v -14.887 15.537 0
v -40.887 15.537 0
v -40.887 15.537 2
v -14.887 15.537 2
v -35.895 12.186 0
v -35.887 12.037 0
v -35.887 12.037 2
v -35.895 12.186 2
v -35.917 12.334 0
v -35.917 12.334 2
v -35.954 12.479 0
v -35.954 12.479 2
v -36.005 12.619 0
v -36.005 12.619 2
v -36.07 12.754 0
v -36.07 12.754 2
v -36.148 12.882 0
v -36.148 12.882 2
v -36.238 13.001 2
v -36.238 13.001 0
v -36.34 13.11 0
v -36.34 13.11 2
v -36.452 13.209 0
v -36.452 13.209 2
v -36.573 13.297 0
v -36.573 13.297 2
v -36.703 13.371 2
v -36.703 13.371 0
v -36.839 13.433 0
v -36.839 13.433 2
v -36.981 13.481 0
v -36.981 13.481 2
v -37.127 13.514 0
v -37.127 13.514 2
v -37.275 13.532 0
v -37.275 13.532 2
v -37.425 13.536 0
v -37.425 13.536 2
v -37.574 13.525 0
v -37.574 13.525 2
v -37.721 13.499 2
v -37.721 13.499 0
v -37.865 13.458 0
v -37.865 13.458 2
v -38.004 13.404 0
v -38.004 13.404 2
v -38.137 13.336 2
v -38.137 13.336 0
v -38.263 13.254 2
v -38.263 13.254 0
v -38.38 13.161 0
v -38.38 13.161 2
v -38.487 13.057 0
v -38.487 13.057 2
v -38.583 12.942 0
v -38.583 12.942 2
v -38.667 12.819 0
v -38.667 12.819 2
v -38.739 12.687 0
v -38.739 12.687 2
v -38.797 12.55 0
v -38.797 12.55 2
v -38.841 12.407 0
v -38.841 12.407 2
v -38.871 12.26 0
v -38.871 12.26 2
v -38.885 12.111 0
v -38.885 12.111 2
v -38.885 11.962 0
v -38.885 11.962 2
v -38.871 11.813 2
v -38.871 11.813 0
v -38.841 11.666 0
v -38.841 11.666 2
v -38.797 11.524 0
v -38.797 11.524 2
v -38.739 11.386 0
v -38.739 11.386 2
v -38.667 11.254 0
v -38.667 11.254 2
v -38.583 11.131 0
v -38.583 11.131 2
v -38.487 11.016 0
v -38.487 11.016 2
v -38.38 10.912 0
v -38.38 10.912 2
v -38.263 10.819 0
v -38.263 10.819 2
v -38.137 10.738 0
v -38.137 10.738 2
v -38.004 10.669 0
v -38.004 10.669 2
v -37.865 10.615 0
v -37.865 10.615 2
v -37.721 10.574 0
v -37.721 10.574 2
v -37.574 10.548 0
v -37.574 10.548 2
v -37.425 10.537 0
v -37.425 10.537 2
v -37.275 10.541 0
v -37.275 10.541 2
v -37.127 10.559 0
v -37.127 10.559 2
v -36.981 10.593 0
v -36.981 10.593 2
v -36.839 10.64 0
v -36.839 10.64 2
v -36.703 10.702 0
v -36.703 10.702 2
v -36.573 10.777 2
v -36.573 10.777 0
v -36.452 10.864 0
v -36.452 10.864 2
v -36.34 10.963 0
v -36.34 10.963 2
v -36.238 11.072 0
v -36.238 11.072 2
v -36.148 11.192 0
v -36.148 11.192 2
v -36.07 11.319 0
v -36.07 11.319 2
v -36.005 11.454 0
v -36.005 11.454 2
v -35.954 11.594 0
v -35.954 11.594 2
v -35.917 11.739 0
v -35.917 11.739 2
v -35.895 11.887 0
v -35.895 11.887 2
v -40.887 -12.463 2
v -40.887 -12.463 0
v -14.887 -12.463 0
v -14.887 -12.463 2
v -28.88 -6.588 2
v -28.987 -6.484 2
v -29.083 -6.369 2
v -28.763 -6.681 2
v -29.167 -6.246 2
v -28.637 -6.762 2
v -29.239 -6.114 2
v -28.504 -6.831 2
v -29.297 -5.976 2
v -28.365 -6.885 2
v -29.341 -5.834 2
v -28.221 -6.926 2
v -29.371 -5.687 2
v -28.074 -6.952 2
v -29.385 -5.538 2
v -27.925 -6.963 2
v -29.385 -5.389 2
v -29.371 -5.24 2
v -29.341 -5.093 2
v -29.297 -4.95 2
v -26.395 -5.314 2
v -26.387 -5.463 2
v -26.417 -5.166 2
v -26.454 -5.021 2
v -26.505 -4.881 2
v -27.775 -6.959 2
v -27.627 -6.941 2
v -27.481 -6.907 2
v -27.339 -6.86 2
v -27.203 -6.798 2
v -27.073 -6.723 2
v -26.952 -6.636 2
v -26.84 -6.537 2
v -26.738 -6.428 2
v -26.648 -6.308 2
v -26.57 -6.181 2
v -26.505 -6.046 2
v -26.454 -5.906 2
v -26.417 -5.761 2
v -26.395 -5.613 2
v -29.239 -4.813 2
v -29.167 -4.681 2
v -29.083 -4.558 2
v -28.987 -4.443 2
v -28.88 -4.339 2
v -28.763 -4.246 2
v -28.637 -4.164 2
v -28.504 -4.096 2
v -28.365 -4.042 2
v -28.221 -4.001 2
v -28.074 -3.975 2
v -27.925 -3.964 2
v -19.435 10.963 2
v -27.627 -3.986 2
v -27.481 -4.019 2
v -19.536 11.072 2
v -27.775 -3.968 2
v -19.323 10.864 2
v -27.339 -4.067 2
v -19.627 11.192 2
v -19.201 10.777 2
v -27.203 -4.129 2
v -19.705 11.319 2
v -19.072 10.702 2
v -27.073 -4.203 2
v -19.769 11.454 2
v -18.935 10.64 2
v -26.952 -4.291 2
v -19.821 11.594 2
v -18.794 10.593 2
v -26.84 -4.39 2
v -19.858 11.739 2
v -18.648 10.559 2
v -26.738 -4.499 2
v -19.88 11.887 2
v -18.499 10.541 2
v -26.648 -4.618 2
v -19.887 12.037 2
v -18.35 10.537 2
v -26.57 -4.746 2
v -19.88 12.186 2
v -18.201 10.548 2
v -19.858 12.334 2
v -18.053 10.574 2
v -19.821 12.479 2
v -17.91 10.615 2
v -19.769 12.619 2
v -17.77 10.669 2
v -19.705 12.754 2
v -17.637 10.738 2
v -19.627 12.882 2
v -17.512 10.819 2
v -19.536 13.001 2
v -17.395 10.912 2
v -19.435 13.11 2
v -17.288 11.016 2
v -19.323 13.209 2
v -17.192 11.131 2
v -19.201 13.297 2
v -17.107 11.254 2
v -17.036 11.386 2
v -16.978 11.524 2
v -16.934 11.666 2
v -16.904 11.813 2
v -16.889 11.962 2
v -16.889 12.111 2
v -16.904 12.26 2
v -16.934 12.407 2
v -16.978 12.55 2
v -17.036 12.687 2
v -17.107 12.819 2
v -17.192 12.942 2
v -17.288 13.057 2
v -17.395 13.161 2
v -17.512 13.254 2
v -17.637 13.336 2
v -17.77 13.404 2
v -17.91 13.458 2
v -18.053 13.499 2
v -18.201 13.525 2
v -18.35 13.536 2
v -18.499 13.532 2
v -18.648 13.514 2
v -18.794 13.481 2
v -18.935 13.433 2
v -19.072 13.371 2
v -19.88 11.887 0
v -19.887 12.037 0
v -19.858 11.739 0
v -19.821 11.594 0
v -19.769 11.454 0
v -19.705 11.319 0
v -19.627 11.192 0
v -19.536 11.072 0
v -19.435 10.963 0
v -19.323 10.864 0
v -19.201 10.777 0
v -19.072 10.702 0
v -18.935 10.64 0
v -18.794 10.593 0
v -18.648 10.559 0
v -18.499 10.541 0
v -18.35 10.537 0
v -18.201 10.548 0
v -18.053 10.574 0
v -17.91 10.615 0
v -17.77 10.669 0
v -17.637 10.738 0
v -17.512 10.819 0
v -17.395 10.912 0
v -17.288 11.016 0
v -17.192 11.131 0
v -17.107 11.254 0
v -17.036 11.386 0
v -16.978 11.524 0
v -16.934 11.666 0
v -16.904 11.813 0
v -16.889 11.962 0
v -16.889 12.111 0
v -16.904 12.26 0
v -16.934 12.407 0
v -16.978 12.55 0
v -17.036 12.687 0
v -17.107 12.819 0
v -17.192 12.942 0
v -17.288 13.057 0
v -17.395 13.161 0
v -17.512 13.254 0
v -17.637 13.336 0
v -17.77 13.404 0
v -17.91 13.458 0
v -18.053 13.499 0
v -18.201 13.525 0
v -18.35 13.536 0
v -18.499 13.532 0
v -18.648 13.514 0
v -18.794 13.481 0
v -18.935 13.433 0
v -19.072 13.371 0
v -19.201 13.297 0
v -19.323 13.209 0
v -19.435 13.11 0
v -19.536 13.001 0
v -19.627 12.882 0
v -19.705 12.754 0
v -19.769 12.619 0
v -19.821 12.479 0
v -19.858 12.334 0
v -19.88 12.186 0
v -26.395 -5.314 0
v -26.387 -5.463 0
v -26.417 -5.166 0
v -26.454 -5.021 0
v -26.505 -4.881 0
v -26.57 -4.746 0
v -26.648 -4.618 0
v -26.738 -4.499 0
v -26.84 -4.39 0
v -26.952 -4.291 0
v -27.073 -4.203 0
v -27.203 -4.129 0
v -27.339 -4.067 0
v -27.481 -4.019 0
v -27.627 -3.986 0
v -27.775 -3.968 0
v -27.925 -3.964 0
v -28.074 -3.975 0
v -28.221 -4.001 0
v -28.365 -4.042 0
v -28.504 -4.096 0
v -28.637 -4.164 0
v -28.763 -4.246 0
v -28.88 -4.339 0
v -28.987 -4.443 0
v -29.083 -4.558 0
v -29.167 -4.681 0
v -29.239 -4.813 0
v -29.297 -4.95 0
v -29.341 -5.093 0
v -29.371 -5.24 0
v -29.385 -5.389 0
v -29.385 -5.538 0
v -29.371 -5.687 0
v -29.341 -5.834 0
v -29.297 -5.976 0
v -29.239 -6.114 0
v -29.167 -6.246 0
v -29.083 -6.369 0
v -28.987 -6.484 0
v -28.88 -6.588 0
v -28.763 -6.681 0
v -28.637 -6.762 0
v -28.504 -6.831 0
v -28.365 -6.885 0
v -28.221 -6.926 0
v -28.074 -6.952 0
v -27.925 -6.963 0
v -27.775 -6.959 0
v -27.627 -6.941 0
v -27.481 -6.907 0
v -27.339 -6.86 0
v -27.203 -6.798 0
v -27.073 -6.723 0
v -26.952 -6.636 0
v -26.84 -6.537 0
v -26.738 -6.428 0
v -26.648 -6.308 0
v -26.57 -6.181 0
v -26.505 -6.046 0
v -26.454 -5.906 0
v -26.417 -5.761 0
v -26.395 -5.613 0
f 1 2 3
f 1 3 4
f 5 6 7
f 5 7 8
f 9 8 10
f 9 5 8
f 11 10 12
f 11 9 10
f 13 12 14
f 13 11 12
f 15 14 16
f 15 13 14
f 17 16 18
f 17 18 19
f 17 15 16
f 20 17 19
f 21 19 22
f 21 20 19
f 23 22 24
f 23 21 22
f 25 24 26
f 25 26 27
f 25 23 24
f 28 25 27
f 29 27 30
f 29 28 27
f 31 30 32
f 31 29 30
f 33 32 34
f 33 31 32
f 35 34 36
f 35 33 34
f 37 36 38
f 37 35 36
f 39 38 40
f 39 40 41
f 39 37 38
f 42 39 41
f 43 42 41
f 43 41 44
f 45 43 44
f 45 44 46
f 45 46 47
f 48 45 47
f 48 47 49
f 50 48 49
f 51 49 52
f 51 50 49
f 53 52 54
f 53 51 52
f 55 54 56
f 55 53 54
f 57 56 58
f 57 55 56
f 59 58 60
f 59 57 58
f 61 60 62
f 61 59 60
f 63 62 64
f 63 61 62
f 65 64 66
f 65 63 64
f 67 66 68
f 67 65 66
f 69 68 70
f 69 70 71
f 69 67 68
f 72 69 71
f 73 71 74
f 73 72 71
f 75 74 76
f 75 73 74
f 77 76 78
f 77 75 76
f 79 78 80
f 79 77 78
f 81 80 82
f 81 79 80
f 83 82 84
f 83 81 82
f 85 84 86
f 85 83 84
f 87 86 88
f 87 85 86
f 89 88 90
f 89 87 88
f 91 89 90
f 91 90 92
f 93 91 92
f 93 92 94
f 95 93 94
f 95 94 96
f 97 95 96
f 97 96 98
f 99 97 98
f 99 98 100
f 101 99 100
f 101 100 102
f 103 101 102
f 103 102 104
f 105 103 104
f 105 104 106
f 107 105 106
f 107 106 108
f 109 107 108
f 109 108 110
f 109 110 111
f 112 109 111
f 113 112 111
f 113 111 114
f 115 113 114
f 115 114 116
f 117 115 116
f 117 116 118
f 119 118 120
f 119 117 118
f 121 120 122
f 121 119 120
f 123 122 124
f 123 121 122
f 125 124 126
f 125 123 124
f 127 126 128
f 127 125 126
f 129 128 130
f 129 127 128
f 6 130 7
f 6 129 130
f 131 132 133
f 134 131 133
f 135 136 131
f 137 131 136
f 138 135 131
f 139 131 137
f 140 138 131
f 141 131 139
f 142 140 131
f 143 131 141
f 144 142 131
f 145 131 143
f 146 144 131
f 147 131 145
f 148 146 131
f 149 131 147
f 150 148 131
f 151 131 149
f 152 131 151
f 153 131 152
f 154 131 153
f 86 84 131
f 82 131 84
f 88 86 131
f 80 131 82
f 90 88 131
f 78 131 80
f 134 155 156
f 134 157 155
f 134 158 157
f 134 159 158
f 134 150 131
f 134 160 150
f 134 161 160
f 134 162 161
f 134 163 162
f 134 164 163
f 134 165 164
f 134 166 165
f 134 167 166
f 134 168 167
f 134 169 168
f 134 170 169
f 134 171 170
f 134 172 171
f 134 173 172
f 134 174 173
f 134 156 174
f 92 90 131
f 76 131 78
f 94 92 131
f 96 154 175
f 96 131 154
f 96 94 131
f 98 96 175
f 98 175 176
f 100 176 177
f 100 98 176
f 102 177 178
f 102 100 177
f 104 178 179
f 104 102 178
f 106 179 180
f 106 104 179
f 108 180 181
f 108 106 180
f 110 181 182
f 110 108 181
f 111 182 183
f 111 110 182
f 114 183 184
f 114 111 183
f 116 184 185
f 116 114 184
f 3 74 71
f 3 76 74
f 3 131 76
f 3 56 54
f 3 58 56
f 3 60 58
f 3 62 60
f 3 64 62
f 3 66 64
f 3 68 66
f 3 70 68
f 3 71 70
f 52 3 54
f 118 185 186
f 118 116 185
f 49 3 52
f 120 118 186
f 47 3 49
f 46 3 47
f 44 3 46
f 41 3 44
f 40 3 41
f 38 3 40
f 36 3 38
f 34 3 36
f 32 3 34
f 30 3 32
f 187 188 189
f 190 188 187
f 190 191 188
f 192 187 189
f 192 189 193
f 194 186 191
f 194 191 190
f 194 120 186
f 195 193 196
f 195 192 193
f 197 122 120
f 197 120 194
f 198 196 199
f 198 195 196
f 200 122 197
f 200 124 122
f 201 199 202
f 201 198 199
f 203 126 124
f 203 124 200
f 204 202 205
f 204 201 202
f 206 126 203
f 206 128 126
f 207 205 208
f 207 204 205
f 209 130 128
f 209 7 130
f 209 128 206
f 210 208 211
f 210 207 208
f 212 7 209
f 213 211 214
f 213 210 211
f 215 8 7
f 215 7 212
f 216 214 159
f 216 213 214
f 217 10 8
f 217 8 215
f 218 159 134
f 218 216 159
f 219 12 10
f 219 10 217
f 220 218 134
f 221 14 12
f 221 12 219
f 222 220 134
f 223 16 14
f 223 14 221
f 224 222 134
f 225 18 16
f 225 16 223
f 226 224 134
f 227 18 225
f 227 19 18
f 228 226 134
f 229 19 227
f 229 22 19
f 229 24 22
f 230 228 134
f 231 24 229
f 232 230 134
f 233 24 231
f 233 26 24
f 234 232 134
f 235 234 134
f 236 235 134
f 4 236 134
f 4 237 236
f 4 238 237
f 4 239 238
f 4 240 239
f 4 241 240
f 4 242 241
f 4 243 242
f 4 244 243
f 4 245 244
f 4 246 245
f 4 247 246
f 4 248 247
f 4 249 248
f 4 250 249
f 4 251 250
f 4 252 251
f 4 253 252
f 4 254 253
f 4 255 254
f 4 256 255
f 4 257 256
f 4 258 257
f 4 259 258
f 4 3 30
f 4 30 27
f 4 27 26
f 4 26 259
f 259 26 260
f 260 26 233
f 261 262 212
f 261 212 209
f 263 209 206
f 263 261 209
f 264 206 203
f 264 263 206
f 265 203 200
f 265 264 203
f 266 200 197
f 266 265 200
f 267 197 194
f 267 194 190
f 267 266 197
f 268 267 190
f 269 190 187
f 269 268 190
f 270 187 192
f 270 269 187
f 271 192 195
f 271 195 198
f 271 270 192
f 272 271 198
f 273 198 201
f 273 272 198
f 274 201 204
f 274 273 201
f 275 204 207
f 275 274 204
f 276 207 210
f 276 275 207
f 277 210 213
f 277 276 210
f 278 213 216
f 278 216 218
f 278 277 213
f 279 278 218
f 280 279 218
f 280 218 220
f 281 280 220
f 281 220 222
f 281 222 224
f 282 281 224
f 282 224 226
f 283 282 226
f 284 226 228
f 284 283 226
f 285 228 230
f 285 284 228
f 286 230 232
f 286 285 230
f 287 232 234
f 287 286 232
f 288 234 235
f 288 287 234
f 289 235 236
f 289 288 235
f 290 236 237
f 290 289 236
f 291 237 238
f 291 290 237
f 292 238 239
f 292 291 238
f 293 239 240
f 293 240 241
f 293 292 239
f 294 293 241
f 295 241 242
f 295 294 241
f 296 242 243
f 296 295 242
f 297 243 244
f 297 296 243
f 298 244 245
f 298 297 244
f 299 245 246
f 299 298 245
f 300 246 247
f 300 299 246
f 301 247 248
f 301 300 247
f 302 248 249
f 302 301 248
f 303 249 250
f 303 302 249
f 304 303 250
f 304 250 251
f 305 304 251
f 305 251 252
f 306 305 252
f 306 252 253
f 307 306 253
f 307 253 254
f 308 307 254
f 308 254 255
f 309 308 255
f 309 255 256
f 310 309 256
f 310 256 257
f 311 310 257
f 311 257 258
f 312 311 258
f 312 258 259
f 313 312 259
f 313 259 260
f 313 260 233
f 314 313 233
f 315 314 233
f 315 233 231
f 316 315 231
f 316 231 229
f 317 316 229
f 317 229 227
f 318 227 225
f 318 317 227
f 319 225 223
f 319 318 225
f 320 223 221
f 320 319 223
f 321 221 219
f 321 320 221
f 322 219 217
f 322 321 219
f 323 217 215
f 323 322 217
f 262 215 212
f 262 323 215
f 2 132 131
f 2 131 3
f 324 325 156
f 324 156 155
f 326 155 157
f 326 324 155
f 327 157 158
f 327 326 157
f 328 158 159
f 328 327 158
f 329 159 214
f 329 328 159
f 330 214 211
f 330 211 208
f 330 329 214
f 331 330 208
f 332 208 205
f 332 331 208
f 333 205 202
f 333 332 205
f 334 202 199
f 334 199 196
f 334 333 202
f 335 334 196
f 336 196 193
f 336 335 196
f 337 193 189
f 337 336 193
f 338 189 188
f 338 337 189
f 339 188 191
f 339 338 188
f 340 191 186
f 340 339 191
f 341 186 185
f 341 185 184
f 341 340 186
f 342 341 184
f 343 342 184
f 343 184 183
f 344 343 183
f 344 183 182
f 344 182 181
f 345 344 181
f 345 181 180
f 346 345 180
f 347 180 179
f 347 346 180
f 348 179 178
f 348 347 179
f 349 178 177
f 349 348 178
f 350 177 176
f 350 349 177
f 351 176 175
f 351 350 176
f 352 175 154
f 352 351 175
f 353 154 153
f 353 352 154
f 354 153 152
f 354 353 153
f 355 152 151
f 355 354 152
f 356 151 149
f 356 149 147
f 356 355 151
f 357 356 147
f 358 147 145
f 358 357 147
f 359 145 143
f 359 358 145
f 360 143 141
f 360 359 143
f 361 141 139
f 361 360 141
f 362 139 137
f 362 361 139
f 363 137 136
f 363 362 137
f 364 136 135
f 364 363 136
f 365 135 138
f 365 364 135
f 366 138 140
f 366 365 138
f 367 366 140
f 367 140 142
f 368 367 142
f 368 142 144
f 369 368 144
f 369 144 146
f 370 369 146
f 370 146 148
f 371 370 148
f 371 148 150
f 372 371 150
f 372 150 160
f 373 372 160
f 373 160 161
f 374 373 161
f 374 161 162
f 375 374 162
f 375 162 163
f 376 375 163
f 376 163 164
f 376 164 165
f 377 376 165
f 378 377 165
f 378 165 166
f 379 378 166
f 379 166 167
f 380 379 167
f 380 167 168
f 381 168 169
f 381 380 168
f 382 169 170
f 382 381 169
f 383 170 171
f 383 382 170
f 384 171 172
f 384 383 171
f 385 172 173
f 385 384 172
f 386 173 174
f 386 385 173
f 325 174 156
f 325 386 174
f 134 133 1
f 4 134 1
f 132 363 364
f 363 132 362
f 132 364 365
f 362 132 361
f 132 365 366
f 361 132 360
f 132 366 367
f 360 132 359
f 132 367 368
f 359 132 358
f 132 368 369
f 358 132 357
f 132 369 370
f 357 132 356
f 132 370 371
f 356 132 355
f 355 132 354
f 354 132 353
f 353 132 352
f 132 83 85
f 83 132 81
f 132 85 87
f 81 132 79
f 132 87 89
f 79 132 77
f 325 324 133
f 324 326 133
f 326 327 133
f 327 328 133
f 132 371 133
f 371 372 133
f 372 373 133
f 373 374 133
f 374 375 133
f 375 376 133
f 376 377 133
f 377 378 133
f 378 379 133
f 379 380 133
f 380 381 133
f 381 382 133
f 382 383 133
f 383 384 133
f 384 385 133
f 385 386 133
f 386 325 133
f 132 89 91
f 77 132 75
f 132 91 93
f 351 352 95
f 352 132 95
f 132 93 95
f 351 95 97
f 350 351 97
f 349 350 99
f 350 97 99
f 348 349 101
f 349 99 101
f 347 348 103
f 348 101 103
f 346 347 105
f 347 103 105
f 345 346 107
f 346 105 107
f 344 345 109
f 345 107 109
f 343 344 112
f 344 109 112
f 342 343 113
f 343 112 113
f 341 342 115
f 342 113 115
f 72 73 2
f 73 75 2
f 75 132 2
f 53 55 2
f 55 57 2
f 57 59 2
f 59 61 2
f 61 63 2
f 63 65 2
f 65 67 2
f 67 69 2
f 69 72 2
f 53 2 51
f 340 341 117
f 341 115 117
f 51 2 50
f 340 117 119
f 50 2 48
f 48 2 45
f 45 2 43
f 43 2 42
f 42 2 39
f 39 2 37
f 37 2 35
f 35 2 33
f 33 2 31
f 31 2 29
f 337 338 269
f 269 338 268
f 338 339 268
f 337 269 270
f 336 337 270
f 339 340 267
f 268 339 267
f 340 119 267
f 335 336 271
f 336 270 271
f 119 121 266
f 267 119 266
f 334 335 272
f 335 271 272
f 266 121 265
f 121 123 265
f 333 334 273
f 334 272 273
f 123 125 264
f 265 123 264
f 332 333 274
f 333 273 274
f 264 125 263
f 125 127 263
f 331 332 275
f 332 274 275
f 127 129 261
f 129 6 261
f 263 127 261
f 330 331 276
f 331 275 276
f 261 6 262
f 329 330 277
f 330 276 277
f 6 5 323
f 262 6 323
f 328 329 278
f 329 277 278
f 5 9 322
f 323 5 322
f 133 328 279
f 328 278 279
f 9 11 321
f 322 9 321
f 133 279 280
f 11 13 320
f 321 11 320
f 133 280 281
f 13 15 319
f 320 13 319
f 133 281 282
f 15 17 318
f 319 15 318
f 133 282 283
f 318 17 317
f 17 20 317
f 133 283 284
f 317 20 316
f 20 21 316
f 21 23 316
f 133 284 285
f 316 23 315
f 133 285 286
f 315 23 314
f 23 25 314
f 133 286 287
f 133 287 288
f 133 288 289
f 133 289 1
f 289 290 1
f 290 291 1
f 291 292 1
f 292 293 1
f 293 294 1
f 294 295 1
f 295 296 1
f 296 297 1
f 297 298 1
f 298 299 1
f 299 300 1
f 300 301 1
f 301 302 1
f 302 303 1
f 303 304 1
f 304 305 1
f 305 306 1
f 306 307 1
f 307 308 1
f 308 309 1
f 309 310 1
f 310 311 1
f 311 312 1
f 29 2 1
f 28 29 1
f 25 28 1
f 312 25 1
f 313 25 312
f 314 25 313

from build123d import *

# Parameters (mm, degrees)
CROQUIS1_W              = 26
CROQUIS1_H              = 28
CROQUIS1_R              = 1.5
SALIENTE_EXTRUIR1_DEPTH = 2


with BuildPart() as part:
    # Croquis1 → Saliente-Extruir1 (new body)
    with BuildSketch(Plane.XY):
        with Locations((-27.887270297, 1.536585366)):
            Rectangle(CROQUIS1_W, CROQUIS1_H)
        with Locations((-37.387270297, 12.036585366)):
            Circle(CROQUIS1_R, mode=Mode.SUBTRACT)
        with Locations(Location((-18.387270297, 12.036585366, 0), (0, 0, 180))):
            Circle(CROQUIS1_R, mode=Mode.SUBTRACT)
        with Locations((-27.887270297, -5.463414634)):
            Circle(CROQUIS1_R, mode=Mode.SUBTRACT)
    extrude(amount=SALIENTE_EXTRUIR1_DEPTH)


solid = part.part
